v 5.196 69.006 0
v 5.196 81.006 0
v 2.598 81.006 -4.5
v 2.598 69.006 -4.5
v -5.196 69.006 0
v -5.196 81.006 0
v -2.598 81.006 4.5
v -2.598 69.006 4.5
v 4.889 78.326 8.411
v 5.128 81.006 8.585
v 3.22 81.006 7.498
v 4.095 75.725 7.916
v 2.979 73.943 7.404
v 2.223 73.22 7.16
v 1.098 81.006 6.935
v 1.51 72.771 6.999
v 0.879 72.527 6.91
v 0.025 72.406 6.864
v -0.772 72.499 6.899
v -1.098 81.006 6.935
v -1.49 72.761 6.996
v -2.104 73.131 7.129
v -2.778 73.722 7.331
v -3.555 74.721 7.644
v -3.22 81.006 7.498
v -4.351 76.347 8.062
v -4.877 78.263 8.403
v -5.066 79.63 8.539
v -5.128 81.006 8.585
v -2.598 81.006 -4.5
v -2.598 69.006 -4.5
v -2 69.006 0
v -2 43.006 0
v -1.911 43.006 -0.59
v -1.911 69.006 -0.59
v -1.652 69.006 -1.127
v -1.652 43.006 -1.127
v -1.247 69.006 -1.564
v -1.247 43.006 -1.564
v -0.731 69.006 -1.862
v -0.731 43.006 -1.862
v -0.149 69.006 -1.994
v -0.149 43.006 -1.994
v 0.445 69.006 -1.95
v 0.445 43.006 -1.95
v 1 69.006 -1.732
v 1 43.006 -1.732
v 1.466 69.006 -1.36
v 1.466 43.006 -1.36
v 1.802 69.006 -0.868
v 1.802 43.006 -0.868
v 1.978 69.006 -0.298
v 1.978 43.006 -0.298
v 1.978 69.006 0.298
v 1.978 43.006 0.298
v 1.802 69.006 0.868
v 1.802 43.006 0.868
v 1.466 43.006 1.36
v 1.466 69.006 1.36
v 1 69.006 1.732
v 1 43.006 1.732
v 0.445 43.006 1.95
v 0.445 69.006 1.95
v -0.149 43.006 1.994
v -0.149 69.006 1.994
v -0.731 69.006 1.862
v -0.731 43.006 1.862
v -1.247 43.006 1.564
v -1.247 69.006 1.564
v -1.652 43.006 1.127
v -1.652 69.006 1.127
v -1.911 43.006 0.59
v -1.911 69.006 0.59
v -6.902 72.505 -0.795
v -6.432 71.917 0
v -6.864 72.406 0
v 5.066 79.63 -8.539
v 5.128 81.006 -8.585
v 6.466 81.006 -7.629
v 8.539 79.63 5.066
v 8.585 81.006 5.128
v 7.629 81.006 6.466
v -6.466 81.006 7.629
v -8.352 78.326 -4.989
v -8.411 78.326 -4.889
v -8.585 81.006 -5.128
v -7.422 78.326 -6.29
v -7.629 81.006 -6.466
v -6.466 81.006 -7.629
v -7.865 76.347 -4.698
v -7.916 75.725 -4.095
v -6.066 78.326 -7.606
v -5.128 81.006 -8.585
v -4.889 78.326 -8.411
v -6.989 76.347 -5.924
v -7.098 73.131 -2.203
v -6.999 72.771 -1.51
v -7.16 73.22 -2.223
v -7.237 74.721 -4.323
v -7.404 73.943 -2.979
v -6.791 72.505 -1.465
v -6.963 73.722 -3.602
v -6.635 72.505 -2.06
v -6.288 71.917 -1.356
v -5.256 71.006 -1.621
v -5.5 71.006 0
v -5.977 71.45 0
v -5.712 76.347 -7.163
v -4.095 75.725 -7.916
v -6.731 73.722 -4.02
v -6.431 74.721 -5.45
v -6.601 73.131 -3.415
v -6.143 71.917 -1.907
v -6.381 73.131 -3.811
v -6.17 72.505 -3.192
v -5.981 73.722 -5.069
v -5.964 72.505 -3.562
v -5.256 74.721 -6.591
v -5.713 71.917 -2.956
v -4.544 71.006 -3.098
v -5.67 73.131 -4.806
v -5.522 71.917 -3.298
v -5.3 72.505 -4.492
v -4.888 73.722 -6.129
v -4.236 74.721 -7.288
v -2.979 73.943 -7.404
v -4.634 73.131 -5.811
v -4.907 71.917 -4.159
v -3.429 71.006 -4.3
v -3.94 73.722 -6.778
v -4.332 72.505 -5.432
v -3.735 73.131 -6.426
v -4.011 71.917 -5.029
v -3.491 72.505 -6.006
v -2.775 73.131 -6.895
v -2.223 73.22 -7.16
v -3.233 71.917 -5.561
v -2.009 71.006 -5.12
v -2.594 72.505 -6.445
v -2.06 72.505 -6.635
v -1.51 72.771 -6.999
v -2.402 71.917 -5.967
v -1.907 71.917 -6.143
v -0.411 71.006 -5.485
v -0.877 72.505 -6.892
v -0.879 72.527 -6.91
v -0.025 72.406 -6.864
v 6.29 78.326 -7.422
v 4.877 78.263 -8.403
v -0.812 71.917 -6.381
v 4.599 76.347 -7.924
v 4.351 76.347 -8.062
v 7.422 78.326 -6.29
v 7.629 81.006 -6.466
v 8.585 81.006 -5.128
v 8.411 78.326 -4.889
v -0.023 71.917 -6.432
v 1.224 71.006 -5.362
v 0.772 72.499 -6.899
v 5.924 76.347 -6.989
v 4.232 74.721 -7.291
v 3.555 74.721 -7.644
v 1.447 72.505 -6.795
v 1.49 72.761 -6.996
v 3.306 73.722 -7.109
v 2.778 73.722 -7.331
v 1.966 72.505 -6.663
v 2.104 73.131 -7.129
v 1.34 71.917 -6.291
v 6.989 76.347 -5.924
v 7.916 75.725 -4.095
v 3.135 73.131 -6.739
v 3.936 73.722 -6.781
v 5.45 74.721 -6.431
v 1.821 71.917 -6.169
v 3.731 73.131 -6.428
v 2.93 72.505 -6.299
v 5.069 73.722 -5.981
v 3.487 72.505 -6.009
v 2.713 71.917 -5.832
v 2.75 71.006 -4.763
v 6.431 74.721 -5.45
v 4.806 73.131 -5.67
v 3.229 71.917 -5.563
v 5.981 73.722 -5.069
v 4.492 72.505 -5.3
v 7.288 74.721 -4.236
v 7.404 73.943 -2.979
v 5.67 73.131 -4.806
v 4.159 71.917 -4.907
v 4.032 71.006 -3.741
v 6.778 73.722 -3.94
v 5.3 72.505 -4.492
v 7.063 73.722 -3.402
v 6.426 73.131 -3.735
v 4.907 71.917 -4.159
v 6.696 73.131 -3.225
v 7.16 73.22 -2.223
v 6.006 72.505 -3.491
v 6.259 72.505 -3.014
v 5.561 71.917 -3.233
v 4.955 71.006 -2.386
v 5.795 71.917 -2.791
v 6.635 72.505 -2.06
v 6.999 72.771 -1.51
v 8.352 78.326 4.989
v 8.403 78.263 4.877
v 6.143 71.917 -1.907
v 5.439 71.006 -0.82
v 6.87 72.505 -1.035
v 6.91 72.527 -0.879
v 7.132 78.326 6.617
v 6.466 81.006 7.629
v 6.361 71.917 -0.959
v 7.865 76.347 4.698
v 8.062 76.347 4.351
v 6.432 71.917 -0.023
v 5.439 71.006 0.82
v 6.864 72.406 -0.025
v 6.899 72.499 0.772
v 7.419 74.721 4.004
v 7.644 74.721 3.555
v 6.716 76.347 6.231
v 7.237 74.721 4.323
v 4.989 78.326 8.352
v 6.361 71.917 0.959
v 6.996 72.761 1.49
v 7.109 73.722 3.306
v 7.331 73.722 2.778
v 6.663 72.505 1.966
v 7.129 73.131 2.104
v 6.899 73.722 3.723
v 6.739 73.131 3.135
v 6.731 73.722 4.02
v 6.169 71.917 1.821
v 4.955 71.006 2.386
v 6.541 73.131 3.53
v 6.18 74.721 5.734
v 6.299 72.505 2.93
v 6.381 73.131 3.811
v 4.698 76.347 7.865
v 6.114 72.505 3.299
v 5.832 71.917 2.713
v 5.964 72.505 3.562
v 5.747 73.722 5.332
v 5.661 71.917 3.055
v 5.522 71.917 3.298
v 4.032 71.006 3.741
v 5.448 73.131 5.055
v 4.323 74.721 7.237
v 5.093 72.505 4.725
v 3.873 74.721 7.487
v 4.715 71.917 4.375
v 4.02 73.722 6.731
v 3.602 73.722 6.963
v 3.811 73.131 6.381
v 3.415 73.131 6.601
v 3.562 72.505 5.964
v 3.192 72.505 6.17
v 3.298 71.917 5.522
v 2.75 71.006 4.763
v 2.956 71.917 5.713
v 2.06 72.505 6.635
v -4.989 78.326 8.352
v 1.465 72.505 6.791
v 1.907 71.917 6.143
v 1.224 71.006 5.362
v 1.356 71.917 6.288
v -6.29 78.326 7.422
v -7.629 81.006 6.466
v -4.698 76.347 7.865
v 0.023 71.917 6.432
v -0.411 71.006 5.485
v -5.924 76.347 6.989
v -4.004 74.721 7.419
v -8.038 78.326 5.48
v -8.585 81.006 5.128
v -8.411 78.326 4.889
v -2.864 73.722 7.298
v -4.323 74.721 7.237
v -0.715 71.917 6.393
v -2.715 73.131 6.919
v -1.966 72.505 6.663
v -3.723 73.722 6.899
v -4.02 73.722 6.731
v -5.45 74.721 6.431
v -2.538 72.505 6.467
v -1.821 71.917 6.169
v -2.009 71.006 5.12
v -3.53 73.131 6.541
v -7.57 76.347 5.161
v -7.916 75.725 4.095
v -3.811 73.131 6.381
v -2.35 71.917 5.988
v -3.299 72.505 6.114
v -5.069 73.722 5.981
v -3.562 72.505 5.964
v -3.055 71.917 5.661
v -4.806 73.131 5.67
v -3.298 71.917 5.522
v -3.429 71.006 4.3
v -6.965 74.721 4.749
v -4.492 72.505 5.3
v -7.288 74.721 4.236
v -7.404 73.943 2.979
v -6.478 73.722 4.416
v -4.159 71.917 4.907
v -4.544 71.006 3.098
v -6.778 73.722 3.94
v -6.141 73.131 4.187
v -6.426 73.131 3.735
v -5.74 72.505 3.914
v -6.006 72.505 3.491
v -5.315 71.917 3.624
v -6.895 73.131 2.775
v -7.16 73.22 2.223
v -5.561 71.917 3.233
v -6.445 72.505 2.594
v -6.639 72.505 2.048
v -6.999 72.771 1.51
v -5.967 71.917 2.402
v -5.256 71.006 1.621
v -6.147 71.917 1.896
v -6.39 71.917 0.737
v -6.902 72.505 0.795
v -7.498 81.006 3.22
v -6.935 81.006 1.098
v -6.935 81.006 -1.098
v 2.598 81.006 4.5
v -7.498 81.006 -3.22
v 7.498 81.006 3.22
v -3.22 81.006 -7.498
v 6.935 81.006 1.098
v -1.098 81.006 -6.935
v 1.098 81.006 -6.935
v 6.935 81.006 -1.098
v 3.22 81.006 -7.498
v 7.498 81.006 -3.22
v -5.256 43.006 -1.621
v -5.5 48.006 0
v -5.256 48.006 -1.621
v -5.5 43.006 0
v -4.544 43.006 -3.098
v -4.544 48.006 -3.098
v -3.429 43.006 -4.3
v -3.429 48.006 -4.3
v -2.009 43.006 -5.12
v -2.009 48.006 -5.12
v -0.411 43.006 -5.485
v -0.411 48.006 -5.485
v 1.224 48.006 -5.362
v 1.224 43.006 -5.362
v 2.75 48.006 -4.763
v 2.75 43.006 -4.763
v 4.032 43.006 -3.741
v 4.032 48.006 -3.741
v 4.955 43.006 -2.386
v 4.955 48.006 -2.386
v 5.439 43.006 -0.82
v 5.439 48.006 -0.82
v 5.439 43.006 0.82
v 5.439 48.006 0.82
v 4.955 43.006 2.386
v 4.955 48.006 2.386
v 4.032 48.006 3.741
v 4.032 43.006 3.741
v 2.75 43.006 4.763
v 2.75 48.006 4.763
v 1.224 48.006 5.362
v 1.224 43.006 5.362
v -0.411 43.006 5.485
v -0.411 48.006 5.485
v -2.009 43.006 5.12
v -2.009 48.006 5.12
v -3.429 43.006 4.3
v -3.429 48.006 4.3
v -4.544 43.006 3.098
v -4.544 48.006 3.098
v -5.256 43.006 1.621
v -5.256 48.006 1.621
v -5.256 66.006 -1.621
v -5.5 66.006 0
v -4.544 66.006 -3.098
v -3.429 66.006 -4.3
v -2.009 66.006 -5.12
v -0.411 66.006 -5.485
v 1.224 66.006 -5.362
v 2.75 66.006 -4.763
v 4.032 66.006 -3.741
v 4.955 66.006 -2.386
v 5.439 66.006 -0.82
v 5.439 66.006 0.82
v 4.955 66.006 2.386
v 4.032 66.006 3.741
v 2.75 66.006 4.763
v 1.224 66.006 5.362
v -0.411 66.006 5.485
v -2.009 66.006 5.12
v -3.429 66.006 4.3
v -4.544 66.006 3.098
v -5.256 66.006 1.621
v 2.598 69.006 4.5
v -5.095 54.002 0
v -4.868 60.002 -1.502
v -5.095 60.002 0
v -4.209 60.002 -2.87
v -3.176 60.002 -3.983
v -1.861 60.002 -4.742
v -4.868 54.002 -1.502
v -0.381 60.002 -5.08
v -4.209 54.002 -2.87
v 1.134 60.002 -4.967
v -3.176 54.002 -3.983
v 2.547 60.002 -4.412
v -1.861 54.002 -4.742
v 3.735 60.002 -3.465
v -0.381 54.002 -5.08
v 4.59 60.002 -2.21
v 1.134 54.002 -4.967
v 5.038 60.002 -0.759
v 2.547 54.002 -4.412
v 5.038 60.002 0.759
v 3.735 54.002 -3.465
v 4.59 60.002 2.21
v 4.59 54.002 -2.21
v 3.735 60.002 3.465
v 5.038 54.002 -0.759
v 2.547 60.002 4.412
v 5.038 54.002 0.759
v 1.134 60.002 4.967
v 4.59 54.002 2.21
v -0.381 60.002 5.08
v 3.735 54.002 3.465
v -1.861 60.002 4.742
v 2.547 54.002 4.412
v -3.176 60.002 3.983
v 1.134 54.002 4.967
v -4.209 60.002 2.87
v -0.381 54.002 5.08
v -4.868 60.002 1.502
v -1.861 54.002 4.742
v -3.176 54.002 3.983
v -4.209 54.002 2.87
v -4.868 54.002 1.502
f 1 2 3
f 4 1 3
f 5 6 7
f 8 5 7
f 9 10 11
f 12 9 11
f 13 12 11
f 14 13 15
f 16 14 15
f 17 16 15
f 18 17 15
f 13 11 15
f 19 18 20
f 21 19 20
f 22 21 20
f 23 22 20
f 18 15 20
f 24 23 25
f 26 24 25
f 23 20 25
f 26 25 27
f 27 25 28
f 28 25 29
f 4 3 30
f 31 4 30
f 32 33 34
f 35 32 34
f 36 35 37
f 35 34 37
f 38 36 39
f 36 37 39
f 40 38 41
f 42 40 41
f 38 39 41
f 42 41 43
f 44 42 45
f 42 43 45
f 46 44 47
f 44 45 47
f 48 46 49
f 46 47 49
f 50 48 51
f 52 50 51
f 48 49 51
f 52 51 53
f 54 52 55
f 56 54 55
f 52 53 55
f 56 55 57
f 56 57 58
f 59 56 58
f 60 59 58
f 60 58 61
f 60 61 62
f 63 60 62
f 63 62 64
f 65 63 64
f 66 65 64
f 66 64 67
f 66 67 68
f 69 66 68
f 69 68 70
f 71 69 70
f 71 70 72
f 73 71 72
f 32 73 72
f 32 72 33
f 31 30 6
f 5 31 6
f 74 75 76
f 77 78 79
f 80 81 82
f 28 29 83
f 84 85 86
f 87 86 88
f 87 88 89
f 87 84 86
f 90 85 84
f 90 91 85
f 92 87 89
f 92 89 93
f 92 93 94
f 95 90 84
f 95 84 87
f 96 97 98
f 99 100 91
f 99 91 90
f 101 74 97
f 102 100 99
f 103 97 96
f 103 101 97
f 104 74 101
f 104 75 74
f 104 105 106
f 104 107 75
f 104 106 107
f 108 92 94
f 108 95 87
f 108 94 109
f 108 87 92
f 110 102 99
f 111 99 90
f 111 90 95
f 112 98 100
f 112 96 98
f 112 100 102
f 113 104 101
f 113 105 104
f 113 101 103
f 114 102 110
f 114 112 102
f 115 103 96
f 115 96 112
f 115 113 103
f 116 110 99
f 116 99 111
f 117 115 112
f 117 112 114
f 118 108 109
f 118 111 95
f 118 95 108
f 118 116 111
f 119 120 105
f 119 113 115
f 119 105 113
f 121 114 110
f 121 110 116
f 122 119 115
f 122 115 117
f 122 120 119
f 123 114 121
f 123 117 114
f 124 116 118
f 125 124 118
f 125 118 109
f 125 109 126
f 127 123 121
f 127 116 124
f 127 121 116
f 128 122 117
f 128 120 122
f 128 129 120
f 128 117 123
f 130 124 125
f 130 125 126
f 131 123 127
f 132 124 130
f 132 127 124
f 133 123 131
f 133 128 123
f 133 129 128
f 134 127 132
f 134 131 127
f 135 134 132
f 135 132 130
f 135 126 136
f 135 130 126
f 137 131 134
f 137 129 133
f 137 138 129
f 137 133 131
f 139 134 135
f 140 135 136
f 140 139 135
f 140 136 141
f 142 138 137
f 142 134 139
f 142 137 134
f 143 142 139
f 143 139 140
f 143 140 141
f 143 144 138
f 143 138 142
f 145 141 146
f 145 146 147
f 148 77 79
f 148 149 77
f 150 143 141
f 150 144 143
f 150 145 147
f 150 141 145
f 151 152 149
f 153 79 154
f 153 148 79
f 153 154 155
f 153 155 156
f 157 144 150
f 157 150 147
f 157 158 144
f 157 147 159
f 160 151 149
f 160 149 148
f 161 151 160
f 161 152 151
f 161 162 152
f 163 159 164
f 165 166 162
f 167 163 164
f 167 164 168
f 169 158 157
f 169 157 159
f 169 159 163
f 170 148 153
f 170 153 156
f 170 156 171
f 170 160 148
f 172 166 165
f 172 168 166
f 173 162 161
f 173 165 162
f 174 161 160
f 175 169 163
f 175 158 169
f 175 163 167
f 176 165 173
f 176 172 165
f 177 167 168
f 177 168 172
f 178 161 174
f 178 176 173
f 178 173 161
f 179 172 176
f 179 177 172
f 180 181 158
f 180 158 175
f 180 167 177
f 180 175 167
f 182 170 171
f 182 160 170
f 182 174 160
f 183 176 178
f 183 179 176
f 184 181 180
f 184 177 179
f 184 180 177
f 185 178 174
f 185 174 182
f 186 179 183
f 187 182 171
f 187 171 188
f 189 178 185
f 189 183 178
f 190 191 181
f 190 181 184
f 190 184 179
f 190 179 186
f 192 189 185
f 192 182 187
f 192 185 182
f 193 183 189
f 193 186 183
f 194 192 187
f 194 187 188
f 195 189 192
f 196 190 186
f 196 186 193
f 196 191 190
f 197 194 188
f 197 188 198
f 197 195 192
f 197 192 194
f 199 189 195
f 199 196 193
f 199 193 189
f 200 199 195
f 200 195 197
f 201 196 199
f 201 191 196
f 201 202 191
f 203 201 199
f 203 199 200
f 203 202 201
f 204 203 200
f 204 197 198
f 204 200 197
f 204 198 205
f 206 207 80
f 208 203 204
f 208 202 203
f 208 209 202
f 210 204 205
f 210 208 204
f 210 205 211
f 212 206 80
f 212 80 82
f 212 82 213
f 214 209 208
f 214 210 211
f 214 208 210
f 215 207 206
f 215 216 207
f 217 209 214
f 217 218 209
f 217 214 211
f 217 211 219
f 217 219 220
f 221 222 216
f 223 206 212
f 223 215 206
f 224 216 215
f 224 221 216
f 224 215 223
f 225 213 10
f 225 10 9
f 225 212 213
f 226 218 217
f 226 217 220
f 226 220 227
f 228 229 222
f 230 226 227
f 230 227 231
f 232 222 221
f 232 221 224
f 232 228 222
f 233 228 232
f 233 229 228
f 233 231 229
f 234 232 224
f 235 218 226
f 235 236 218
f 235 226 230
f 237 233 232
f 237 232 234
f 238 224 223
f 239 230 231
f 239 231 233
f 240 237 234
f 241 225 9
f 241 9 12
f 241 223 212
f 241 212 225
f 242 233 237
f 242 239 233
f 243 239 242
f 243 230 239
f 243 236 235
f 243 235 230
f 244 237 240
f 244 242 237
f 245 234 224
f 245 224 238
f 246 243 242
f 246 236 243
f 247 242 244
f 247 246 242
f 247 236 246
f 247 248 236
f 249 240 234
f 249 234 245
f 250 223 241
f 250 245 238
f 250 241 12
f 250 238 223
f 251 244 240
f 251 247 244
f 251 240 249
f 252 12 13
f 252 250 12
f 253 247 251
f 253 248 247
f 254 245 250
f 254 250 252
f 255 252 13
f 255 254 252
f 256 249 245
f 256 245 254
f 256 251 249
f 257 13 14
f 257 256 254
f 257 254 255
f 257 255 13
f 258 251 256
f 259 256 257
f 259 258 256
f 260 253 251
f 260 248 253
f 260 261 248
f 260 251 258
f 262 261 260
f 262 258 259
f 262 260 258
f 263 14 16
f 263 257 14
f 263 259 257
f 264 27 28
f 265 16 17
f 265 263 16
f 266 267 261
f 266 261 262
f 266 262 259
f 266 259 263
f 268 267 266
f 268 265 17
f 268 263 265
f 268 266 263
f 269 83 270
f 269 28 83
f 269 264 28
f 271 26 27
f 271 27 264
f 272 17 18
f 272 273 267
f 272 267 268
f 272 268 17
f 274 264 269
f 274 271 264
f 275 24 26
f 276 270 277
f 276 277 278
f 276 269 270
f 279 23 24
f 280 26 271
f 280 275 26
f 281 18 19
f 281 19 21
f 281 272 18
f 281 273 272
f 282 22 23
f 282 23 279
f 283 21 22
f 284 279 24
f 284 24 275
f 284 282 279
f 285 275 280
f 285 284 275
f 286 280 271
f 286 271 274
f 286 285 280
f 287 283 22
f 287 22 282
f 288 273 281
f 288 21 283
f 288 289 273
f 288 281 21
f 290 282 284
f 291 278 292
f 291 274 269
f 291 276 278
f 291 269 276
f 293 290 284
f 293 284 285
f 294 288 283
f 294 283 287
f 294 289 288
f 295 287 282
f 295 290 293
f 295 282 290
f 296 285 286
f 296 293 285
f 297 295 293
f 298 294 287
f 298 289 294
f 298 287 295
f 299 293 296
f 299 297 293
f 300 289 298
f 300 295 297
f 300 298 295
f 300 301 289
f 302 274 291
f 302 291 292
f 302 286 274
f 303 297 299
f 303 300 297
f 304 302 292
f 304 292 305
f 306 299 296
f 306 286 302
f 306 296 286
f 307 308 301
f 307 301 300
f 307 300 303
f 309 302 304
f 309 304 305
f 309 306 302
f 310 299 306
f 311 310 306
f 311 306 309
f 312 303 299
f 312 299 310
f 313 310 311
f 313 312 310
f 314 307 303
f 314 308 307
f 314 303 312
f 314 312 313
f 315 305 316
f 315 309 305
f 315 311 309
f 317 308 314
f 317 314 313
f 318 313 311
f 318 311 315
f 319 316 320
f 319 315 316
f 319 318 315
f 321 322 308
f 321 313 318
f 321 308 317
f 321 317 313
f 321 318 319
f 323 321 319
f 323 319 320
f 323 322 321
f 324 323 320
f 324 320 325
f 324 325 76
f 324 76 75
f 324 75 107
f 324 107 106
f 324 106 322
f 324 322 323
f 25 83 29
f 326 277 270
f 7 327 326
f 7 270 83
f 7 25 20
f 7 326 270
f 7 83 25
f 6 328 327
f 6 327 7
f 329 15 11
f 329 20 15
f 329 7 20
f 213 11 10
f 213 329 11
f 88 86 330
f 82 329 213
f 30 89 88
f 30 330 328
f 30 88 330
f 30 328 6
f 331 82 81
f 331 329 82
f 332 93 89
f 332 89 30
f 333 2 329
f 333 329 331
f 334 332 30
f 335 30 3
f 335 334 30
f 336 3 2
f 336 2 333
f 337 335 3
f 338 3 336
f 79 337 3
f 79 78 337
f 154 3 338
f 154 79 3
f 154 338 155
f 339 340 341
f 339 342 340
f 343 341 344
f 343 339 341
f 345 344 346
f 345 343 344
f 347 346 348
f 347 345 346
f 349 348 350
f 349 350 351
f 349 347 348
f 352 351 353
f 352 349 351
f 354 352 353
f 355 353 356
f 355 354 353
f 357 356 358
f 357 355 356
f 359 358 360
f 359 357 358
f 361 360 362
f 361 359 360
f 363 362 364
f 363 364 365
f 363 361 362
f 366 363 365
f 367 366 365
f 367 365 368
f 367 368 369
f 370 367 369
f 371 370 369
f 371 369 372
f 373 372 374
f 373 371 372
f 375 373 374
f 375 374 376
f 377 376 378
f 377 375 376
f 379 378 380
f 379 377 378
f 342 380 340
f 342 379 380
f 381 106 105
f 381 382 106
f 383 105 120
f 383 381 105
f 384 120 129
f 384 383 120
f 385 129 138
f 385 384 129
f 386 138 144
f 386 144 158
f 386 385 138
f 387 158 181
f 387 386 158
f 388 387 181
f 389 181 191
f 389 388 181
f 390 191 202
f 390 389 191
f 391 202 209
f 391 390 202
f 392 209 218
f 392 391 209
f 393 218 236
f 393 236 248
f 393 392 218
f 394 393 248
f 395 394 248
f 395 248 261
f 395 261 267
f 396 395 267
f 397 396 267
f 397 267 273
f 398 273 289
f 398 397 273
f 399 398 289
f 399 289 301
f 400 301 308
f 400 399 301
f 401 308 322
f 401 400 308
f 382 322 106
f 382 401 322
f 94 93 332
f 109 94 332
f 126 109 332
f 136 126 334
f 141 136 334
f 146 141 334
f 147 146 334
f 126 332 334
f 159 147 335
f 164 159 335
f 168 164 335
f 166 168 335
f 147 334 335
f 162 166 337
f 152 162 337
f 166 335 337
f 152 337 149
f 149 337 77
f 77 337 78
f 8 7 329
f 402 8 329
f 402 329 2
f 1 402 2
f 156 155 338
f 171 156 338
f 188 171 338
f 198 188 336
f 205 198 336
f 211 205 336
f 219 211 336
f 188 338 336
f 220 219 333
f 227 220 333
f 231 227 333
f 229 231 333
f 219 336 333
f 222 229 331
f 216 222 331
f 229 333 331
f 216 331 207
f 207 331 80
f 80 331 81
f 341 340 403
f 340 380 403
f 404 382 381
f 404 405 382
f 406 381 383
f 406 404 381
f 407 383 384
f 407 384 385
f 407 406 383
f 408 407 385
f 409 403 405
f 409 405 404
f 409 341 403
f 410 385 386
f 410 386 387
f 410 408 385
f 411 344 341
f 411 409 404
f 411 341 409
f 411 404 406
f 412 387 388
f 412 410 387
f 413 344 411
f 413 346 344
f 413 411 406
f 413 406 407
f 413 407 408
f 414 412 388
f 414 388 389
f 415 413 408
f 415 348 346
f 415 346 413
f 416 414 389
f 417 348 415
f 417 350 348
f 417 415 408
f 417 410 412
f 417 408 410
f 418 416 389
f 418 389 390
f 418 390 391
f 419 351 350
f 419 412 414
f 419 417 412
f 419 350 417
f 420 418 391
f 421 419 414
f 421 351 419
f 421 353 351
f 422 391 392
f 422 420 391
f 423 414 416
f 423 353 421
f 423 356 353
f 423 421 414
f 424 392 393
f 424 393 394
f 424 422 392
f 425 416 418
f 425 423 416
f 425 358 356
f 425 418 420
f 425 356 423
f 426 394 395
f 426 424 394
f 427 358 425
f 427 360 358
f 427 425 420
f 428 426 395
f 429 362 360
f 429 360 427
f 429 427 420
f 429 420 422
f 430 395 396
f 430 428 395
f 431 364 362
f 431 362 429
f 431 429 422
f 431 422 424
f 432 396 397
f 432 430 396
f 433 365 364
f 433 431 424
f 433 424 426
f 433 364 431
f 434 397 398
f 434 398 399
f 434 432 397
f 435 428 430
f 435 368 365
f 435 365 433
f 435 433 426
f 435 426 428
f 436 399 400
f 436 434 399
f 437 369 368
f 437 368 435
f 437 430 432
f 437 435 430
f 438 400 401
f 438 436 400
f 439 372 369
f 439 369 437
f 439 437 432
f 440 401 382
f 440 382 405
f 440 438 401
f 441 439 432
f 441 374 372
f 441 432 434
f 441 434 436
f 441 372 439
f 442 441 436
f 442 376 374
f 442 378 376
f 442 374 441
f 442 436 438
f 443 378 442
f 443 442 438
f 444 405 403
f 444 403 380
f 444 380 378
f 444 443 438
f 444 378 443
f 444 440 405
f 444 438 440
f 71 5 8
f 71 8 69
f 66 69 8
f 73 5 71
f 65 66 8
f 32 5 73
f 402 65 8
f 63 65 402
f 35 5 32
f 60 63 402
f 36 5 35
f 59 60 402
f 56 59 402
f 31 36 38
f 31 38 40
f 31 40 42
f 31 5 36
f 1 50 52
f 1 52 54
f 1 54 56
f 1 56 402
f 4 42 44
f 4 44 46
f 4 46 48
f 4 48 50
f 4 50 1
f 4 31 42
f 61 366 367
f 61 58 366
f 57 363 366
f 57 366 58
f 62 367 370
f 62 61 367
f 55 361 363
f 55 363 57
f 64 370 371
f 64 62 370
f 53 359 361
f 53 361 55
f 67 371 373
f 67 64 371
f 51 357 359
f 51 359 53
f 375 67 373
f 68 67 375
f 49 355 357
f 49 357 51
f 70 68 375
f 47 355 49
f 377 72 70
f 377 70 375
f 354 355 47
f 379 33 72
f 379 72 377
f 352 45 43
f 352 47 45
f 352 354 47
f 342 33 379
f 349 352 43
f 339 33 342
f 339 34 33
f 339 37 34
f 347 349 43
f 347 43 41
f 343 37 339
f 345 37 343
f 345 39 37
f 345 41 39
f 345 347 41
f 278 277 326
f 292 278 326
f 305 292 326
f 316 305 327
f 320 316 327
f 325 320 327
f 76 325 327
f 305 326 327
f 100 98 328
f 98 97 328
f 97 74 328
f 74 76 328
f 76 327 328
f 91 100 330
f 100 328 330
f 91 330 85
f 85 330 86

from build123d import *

# Parameters (mm, degrees)
SKETCH2_R                = 8.5
CUT_EXTRUDE1_DEPTH       = 10
CIRPATTERN1_COUNT        = 4
CUT_EXTRUDE2_DEPTH       = 12
F_4_0_4_DIAMETER_HOLE1_D = 4


with BuildPart() as part:
    # Sketch1 → Revolve3 (revolve)
    with BuildSketch(Plane.XY):
        with BuildLine():
            Line((0, 81.005557052), (-10, 81.005557052))
            ThreePointArc((-10, 81.005557052), (-8.823173444, 75.522629002), (-5.5, 71.005557052))
            Line((-5.5, 71.005557052), (-5.5, 66.005557052))
            add(Edge.make_bspline(
                [(-5.5, 66.005557052), (-4.587686539, 56.99839644), (-5.5, 48.005557052)],
                knots=[0, 0, 0, 1, 1, 1], degree=2))
            Line((-5.5, 48.005557052), (-5.5, 43.005557052))
            Line((-5.5, 43.005557052), (0, 43.005557052))
            Line((0, 43.005557052), (0, 81.005557052))
        make_face()
    revolve(axis=Axis((0, 81.005557052, 0), (0, -1, 0)))

    # Sketch2 → Cut-Extrude1 (cut)
    with BuildSketch(Plane(origin=(0, 81.005557052, 0), x_dir=(1, 0, 0), z_dir=(0, 1, 0))):
        with Locations((0, 15.36427344)):
            Circle(SKETCH2_R)
    cut_extrude1 = extrude(amount=-CUT_EXTRUDE1_DEPTH, mode=Mode.SUBTRACT)

    # CirPattern1: Cut-Extrude1 ×4 about axis
    cirpattern1_axis = Axis((0, 0, 0), (0, 1, 0))
    for i in range(1, CIRPATTERN1_COUNT):
        add(cut_extrude1.rotate(cirpattern1_axis, i * 360 / CIRPATTERN1_COUNT), mode=Mode.SUBTRACT)

    # Sketch3 → Cut-Extrude2 (cut)
    with BuildSketch(Plane(origin=(0, 81.005557052, 0), x_dir=(1, 0, 0), z_dir=(0, 1, 0))):
        Polygon((-2.598076211, 4.5), (-5.196152423, 0), (-2.598076211, -4.5), (2.598076211, -4.5), (5.196152423, 0), (2.598076211, 4.5), align=None)
    extrude(amount=-CUT_EXTRUDE2_DEPTH, mode=Mode.SUBTRACT)

    # Ø4.0 (4) Diameter Hole1 (through all)
    with Locations(Plane(origin=(0, 69.005557052, 0), x_dir=(1, 0, 0), z_dir=(0, 1, 0))):
        with Locations((0, 0)):
            Hole(F_4_0_4_DIAMETER_HOLE1_D / 2)


solid = part.part
